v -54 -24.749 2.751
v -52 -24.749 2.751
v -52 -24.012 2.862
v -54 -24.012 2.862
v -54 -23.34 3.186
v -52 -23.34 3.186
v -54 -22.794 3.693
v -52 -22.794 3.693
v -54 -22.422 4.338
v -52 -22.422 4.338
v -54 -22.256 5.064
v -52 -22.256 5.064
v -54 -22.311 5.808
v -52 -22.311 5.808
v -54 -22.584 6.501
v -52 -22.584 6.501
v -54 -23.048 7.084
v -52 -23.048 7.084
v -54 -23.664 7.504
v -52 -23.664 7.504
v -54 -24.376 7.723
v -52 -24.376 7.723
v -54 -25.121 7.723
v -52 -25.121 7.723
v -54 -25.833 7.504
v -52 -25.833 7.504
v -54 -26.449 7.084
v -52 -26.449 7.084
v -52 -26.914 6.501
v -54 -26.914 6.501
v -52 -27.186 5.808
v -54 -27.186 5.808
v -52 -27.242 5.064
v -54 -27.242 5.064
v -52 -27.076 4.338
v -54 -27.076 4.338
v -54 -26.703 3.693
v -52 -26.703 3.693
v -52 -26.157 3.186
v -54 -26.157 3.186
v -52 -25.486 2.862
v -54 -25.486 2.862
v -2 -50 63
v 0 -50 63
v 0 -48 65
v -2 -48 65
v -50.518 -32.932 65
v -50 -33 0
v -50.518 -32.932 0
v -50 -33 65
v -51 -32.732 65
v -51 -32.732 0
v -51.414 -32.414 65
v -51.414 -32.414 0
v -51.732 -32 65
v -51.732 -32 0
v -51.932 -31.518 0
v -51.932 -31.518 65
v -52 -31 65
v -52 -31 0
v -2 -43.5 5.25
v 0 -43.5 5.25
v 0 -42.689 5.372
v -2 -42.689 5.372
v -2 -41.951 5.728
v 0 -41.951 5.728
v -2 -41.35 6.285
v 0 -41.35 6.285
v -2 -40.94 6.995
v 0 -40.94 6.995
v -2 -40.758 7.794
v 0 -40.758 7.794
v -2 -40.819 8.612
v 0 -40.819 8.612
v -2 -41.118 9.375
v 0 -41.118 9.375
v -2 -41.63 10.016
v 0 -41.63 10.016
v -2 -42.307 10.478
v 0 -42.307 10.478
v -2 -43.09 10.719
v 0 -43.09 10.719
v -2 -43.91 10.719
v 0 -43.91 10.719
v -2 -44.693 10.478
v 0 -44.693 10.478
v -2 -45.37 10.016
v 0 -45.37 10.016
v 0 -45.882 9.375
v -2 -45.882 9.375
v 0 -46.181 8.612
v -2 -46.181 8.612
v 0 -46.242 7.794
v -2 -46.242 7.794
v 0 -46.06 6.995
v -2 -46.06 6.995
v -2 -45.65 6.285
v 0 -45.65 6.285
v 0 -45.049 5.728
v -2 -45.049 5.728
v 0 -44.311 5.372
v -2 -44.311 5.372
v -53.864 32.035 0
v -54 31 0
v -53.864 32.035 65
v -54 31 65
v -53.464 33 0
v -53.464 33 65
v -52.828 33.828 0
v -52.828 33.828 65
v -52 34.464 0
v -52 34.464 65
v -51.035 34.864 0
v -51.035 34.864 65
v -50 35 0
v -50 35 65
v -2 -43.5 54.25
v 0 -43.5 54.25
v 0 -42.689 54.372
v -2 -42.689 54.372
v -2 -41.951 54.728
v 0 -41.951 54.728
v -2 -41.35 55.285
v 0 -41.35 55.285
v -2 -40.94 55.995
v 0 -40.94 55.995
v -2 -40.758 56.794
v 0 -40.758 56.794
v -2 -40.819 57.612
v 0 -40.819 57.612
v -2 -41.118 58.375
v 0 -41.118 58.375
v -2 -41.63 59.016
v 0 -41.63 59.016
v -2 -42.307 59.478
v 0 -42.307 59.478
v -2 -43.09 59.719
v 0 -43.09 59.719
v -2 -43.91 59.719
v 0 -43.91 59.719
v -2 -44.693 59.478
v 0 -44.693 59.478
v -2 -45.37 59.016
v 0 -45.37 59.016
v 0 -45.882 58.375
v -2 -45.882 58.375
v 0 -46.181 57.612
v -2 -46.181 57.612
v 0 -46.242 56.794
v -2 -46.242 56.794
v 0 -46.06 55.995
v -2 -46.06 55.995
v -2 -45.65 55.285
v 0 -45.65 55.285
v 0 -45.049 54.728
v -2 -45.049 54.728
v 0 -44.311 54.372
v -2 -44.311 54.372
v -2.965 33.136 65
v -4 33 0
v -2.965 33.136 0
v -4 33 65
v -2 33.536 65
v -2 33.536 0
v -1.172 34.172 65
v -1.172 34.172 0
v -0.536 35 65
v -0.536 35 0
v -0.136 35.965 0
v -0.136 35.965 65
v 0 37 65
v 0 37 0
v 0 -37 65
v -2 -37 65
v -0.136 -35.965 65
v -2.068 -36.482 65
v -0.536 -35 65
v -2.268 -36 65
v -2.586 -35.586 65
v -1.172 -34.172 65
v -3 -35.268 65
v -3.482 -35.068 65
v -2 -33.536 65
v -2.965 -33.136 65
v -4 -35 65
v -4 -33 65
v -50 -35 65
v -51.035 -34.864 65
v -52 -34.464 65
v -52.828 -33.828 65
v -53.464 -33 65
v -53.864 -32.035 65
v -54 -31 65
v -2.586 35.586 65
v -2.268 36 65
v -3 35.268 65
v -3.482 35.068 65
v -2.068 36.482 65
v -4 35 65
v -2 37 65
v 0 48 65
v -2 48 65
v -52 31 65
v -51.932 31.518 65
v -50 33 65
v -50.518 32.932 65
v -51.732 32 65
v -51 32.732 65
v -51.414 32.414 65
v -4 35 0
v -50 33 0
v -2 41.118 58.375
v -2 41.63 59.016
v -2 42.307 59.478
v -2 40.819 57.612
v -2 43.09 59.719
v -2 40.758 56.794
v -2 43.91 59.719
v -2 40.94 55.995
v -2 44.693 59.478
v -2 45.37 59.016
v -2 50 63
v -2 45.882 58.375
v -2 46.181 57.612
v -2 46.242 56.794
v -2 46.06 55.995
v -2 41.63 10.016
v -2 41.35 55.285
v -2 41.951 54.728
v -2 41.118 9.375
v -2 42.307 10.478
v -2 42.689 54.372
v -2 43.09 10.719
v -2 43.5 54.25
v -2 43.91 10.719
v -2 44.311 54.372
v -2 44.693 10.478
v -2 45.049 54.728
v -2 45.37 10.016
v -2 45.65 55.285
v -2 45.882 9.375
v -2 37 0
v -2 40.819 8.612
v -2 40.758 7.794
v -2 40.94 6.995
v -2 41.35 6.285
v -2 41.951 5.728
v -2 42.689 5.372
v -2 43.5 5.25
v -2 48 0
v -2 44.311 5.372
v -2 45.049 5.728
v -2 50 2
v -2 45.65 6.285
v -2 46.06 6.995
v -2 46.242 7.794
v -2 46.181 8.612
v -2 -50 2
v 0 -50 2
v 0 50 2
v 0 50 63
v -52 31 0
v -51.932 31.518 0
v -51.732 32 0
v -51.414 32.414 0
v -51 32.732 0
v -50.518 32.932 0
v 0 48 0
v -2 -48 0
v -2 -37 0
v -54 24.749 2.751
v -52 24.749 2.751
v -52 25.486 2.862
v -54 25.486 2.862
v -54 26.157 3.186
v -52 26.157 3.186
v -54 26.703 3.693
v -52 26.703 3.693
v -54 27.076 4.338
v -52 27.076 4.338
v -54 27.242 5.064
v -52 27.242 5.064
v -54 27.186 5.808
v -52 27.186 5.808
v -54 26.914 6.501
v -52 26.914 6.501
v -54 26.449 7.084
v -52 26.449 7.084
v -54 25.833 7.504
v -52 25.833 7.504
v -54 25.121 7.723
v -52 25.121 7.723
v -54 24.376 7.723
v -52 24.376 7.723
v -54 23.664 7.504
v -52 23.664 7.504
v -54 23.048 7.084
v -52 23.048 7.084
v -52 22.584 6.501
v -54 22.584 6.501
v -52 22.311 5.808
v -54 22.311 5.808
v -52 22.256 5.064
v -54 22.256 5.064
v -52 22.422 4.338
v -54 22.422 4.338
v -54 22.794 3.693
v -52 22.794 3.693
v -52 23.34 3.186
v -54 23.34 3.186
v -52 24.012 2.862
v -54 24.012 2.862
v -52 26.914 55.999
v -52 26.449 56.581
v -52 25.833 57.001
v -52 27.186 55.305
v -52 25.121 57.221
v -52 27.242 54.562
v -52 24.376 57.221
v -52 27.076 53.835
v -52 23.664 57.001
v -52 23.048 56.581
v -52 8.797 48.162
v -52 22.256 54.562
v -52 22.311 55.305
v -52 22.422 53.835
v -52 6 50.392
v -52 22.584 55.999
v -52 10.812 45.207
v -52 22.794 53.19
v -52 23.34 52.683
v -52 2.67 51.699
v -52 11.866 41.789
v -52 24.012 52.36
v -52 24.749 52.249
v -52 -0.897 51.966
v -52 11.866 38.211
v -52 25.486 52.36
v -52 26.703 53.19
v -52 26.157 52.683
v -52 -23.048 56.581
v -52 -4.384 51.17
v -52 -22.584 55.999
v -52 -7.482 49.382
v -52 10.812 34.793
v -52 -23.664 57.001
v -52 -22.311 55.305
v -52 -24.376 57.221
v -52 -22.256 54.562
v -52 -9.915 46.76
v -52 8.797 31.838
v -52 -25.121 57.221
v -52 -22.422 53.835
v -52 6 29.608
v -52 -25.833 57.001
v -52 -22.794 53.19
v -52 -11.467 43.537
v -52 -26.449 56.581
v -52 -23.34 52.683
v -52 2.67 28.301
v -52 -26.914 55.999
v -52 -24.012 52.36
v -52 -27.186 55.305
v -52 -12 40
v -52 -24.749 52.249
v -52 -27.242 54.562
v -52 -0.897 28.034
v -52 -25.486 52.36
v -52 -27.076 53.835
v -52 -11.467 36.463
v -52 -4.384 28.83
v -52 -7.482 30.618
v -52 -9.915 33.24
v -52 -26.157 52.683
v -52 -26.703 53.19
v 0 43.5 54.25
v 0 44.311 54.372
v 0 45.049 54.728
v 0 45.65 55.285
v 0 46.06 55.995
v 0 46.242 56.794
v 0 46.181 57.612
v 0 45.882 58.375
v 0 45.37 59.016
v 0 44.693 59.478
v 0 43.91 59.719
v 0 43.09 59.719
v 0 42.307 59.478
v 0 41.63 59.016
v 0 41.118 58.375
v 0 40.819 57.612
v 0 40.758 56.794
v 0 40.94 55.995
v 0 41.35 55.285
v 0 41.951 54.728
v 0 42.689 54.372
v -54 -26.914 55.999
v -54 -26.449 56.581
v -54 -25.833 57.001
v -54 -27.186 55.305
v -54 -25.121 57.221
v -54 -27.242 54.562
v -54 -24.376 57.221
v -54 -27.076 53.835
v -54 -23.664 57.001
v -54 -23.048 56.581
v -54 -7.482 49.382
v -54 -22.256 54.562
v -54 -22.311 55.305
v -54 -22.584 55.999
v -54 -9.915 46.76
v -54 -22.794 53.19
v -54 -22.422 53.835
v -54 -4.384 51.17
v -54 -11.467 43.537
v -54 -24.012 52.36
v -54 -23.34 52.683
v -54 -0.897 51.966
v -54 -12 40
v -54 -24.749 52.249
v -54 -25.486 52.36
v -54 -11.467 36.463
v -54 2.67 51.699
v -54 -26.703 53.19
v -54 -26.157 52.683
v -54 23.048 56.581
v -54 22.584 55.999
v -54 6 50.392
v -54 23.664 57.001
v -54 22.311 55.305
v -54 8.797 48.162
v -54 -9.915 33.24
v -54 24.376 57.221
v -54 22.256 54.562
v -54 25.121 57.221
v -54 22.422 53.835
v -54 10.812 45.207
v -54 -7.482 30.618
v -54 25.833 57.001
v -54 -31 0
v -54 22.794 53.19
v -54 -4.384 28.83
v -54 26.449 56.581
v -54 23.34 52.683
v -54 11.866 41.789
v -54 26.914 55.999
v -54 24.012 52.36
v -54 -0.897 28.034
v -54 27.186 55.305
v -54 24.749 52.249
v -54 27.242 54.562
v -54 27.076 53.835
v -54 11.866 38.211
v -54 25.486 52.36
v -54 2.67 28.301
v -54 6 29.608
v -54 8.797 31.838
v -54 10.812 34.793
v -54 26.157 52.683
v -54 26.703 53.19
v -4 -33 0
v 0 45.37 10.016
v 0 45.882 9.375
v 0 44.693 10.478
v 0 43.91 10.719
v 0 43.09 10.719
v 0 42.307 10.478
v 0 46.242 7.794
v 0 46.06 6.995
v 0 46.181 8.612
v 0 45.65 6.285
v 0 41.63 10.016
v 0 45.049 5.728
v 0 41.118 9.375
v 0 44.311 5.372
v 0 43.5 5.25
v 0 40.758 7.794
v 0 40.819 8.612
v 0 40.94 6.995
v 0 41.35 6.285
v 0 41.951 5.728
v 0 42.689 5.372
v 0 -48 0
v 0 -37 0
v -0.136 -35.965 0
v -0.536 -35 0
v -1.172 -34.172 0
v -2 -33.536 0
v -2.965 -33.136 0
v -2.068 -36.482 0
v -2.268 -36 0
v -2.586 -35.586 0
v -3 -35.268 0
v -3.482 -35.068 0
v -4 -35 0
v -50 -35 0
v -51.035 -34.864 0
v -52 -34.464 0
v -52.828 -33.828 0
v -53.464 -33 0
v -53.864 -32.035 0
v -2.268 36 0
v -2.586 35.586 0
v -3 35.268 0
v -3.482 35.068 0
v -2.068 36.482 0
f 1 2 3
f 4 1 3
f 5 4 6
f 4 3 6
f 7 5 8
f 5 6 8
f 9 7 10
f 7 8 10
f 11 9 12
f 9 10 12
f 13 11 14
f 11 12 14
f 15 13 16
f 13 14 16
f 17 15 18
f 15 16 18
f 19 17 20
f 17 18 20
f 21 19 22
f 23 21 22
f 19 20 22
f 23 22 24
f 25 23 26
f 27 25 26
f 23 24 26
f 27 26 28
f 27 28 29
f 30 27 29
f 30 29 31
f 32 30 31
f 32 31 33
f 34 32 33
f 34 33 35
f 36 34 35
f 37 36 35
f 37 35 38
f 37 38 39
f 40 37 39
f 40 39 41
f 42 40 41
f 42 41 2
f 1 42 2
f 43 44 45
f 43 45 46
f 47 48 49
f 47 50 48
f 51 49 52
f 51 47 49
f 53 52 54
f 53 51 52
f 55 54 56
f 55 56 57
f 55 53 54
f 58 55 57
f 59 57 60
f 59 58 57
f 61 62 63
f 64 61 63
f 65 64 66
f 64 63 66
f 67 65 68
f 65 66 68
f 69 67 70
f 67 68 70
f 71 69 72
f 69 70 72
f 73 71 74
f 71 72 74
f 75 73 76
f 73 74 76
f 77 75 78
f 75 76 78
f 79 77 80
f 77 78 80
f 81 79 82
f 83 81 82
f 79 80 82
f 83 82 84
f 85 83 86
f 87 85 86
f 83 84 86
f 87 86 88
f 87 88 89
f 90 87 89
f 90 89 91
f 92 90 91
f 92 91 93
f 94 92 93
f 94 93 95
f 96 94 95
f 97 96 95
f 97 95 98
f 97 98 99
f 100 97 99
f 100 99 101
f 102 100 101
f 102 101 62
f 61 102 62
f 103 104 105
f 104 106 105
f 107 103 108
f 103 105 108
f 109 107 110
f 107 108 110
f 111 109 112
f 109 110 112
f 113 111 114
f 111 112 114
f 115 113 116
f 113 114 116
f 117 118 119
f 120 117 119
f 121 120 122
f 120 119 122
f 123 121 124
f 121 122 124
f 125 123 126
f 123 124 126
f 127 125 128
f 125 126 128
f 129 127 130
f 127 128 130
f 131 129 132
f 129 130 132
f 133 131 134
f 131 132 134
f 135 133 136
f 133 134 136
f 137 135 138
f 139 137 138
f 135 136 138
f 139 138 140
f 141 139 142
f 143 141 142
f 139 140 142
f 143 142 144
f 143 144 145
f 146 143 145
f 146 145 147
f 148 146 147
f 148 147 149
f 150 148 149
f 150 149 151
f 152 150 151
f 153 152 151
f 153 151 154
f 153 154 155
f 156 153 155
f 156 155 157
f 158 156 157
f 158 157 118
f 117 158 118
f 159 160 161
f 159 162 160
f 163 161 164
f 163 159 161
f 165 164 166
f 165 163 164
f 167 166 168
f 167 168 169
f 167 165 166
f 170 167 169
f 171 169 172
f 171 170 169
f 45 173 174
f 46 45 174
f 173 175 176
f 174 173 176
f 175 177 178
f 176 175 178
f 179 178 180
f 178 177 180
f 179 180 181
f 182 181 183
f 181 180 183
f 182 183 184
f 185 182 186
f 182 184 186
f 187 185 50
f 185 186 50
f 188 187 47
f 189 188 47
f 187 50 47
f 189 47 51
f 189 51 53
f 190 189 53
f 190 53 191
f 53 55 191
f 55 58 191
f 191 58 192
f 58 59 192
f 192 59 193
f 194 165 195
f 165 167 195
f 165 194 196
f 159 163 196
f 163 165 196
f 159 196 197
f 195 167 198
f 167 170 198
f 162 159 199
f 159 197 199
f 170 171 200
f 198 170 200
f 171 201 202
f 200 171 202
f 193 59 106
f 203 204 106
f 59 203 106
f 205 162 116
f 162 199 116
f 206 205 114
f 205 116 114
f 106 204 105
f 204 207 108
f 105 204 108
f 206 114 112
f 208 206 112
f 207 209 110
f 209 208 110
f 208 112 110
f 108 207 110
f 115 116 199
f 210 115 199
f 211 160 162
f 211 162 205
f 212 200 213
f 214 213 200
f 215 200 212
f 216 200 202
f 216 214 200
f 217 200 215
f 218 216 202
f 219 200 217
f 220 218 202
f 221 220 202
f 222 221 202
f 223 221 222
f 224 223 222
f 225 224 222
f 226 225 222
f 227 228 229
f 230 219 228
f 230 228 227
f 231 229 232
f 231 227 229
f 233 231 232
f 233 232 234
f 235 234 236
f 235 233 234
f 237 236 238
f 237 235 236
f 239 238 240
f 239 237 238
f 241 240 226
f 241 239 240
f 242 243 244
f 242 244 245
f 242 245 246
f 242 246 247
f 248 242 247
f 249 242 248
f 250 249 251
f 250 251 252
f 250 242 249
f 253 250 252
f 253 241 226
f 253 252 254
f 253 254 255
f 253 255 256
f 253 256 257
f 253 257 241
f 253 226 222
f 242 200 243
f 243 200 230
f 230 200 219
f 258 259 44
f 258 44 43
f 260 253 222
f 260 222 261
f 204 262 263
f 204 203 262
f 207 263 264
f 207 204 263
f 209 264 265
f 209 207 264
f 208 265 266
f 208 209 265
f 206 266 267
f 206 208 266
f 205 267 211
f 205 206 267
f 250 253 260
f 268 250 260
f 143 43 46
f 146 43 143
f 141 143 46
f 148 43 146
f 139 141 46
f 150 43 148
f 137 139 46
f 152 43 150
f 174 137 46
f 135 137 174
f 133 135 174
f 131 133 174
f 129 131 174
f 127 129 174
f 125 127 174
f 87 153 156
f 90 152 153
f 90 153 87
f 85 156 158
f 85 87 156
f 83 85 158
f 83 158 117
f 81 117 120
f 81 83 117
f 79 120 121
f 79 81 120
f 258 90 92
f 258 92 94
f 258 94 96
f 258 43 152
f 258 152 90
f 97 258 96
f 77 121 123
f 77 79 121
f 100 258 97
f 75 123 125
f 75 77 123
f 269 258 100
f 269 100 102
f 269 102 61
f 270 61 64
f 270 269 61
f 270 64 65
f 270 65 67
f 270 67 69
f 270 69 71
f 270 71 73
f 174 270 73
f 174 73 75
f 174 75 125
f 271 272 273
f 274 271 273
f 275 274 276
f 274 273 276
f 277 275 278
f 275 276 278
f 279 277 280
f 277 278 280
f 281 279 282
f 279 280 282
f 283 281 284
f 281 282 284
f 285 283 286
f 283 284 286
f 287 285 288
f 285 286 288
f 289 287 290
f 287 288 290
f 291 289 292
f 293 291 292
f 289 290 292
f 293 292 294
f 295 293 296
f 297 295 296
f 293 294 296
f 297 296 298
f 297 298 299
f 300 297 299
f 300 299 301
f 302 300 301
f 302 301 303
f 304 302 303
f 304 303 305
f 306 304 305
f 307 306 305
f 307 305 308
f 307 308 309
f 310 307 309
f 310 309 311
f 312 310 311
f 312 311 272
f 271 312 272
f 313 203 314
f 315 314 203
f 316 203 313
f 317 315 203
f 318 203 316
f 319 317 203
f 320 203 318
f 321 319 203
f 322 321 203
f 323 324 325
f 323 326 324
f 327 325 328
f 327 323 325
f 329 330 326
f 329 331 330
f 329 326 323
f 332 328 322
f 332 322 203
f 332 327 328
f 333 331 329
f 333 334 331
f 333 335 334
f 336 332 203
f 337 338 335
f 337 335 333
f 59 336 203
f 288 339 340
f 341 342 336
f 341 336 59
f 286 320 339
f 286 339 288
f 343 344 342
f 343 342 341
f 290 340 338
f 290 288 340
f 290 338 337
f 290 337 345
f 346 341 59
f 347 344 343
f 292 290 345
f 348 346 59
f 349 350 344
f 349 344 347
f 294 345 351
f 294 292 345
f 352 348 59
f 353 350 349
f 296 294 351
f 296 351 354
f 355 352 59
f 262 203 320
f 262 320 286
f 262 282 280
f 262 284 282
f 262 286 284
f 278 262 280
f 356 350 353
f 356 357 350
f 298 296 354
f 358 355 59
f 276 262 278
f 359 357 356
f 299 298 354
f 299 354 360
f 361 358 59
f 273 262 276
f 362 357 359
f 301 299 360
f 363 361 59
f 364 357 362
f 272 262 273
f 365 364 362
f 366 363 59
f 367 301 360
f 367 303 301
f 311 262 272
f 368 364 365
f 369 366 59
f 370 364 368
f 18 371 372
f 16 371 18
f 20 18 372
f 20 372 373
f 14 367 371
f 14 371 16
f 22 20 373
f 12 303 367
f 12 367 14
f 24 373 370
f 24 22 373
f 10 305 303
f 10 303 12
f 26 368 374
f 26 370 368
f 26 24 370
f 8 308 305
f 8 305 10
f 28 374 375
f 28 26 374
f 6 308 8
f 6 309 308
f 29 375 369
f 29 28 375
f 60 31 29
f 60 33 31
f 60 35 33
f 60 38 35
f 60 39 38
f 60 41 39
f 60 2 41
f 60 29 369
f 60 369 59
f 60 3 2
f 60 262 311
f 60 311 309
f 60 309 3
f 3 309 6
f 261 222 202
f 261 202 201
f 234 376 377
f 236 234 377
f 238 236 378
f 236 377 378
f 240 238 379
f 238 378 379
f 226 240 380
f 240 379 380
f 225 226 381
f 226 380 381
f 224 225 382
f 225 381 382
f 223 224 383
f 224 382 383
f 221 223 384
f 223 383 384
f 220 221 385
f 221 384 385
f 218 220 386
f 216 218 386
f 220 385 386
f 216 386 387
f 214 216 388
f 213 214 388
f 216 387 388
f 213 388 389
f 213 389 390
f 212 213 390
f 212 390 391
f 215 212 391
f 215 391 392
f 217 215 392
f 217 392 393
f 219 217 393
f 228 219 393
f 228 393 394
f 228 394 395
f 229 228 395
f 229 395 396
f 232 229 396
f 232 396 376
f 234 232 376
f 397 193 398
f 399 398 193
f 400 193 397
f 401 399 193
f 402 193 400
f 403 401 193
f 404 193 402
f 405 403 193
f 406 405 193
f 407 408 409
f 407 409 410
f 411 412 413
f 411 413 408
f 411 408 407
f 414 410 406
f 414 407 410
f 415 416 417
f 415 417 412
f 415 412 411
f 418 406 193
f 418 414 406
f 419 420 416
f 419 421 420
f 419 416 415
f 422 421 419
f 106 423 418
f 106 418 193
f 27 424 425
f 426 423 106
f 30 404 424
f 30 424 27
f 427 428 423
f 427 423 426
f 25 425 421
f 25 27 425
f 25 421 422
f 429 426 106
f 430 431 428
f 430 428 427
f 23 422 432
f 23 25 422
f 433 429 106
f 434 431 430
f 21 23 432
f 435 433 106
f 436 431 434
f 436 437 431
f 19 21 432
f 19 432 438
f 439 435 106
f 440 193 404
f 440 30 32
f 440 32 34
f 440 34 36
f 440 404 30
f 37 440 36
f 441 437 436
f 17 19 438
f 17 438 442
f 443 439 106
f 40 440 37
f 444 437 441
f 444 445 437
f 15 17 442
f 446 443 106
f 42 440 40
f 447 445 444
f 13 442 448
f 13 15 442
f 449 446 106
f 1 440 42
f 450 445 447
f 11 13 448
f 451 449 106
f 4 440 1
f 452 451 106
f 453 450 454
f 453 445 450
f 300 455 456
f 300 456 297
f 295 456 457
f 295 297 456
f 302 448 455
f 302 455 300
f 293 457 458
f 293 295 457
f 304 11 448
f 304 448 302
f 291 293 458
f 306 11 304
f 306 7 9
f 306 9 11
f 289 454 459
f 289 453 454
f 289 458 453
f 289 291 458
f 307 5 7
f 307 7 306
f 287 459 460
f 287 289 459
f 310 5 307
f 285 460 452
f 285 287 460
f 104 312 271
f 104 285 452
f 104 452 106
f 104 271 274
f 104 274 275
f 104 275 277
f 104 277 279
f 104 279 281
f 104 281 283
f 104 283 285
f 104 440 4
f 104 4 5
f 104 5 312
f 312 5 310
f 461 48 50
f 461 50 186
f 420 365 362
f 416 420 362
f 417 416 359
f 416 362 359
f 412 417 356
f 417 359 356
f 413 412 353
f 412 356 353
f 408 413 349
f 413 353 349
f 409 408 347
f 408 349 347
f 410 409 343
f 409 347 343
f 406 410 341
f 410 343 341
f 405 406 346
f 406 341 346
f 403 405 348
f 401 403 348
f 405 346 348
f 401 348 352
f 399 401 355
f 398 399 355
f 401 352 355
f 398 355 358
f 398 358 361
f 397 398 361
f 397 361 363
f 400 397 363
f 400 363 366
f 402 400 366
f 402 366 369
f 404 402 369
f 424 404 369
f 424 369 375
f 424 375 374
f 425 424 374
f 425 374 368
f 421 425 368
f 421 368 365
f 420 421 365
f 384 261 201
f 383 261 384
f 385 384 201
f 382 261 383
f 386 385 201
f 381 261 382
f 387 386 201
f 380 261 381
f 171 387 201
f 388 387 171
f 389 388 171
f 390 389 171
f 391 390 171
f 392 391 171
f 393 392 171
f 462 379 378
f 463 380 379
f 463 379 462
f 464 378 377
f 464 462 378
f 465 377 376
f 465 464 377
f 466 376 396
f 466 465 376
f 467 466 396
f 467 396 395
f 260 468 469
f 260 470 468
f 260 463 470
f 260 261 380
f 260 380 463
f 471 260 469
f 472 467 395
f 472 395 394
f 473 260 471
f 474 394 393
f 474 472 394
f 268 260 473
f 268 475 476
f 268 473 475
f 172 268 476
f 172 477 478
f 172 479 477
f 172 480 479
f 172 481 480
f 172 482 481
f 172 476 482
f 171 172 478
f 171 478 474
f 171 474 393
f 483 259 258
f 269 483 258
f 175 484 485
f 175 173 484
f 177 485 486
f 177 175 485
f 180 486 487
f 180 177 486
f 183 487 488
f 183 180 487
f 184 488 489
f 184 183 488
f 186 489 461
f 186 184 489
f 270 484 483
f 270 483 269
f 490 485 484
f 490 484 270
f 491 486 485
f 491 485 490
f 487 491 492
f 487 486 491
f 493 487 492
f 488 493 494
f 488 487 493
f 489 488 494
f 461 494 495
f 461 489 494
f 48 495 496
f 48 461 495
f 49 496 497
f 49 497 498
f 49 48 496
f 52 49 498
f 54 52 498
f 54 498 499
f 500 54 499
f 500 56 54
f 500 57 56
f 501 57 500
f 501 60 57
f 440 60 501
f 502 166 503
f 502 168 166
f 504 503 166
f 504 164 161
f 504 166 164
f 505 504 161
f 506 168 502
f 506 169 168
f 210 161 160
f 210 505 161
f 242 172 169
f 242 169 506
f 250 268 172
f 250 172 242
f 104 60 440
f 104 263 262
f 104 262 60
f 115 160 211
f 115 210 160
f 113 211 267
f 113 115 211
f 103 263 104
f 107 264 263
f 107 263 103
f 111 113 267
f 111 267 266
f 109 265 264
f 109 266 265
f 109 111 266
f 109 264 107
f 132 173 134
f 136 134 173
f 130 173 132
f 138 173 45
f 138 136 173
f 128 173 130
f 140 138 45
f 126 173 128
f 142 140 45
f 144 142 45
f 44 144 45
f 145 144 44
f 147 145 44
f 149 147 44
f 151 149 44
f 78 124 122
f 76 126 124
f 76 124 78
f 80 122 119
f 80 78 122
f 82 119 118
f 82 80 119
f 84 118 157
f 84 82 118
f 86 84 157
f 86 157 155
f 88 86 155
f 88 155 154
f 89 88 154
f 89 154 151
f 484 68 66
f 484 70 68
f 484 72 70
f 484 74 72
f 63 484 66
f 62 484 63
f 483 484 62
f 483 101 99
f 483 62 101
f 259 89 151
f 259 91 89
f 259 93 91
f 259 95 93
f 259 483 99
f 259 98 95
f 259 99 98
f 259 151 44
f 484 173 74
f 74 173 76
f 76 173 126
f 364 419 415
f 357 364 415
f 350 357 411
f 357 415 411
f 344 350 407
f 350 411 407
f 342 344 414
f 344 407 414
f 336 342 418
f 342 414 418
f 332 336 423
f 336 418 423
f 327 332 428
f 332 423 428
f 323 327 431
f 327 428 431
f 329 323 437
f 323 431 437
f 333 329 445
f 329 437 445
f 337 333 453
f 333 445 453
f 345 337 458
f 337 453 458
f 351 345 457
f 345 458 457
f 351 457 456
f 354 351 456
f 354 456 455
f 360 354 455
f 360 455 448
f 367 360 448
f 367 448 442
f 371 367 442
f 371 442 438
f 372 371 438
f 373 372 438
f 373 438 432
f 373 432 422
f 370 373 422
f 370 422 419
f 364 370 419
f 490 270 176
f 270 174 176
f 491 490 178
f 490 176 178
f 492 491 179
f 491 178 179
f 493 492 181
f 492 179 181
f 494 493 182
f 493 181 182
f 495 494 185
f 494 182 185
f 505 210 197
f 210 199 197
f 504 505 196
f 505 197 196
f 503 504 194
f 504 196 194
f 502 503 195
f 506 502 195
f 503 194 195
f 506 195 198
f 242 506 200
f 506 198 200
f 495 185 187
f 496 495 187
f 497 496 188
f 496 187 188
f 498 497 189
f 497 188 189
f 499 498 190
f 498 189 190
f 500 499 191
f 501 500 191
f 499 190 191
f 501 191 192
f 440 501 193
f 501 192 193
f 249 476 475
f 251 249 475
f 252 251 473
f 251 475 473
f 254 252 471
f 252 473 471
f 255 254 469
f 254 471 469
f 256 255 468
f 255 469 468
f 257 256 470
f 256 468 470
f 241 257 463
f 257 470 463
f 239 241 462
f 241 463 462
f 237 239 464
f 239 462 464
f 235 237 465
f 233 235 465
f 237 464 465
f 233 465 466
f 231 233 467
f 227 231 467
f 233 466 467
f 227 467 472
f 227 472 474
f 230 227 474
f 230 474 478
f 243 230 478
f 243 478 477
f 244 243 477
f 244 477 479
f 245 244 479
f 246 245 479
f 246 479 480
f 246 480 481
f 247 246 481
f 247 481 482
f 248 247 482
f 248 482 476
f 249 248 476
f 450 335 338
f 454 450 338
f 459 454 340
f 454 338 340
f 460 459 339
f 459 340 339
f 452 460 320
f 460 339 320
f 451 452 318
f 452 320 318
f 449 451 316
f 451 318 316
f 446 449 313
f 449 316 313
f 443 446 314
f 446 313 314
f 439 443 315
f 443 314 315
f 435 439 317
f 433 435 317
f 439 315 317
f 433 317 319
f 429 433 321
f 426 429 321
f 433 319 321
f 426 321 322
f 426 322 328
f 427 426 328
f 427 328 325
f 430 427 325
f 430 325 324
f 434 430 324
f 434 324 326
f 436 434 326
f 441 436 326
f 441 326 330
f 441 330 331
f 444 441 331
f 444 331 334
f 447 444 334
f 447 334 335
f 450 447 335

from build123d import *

# Parameters (mm, degrees)
BOSS_EXTRUDE1_DEPTH        = 65
SKETCH2_R                  = 12
CUT_EXTRUDE1_DEPTH         = 99.188594042
F_5_5_5_5_DIAMETER_HOLE1_D = 5.5
F_5_0_5_DIAMETER_HOLE1_D   = 5
CHAMFER1_SIZE              = 2
FILLET1_R                  = 4
FILLET2_R                  = 2


with BuildPart() as part:
    # Sketch1 → Boss-Extrude1 (new body)
    with BuildSketch(Plane.XY):
        Polygon((0, -33), (0, -50), (-2, -50), (-2, -35), (-54, -35), (-54, 35), (-2, 35), (-2, 50), (0, 50), (0, 33), (-52, 33), (-52, -33), align=None)
    extrude(amount=BOSS_EXTRUDE1_DEPTH)

    # Sketch2 → Cut-Extrude1 (cut, through all)
    with BuildSketch(Plane.ZY.offset(54)):
        with Locations(Location((40, 0, 0), (0, 0, 270))):
            Circle(SKETCH2_R)
    extrude(amount=-CUT_EXTRUDE1_DEPTH, mode=Mode.SUBTRACT)

    # Ø5.5 (5.5) Diameter Hole1 (through all)
    with Locations(Plane.ZY.offset(2)):
        with Locations((57, -43.5), (8, -43.5), (57, 43.5), (8, 43.5)):
            Hole(F_5_5_5_5_DIAMETER_HOLE1_D / 2)

    # Ø5.0 (5) Diameter Hole1 (through all)
    with Locations(Plane.ZY.offset(54)):
        with Locations((54.748737342, 24.748737342), (54.748737342, -24.748737342), (5.251262658, -24.748737342), (5.251262658, 24.748737342)):
            Hole(F_5_0_5_DIAMETER_HOLE1_D / 2)

    # Chamfer1
    chamfer1_edges = [part.edges().sort_by_distance(p)[0] for p in [
        (-1, 50, 0),
        (-1, -50, 0),
        (-1, 50, 65),
        (-1, -50, 65),
    ]]
    chamfer(chamfer1_edges, length=CHAMFER1_SIZE)

    # Fillet1
    fillet1_edges = [part.edges().sort_by_distance(p)[0] for p in [
        (-54, -35, 32.5),
        (-54, 35, 32.5),
        (0, 33, 32.5),
        (0, -33, 32.5),
    ]]
    fillet(fillet1_edges, radius=FILLET1_R)

    # Fillet2
    fillet2_edges = [part.edges().sort_by_distance(p)[0] for p in [
        (-2, -35, 32.5),
        (-2, 35, 32.5),
        (-52, 33, 32.5),
        (-52, -33, 32.5),
    ]]
    fillet(fillet2_edges, radius=FILLET2_R)


solid = part.part
